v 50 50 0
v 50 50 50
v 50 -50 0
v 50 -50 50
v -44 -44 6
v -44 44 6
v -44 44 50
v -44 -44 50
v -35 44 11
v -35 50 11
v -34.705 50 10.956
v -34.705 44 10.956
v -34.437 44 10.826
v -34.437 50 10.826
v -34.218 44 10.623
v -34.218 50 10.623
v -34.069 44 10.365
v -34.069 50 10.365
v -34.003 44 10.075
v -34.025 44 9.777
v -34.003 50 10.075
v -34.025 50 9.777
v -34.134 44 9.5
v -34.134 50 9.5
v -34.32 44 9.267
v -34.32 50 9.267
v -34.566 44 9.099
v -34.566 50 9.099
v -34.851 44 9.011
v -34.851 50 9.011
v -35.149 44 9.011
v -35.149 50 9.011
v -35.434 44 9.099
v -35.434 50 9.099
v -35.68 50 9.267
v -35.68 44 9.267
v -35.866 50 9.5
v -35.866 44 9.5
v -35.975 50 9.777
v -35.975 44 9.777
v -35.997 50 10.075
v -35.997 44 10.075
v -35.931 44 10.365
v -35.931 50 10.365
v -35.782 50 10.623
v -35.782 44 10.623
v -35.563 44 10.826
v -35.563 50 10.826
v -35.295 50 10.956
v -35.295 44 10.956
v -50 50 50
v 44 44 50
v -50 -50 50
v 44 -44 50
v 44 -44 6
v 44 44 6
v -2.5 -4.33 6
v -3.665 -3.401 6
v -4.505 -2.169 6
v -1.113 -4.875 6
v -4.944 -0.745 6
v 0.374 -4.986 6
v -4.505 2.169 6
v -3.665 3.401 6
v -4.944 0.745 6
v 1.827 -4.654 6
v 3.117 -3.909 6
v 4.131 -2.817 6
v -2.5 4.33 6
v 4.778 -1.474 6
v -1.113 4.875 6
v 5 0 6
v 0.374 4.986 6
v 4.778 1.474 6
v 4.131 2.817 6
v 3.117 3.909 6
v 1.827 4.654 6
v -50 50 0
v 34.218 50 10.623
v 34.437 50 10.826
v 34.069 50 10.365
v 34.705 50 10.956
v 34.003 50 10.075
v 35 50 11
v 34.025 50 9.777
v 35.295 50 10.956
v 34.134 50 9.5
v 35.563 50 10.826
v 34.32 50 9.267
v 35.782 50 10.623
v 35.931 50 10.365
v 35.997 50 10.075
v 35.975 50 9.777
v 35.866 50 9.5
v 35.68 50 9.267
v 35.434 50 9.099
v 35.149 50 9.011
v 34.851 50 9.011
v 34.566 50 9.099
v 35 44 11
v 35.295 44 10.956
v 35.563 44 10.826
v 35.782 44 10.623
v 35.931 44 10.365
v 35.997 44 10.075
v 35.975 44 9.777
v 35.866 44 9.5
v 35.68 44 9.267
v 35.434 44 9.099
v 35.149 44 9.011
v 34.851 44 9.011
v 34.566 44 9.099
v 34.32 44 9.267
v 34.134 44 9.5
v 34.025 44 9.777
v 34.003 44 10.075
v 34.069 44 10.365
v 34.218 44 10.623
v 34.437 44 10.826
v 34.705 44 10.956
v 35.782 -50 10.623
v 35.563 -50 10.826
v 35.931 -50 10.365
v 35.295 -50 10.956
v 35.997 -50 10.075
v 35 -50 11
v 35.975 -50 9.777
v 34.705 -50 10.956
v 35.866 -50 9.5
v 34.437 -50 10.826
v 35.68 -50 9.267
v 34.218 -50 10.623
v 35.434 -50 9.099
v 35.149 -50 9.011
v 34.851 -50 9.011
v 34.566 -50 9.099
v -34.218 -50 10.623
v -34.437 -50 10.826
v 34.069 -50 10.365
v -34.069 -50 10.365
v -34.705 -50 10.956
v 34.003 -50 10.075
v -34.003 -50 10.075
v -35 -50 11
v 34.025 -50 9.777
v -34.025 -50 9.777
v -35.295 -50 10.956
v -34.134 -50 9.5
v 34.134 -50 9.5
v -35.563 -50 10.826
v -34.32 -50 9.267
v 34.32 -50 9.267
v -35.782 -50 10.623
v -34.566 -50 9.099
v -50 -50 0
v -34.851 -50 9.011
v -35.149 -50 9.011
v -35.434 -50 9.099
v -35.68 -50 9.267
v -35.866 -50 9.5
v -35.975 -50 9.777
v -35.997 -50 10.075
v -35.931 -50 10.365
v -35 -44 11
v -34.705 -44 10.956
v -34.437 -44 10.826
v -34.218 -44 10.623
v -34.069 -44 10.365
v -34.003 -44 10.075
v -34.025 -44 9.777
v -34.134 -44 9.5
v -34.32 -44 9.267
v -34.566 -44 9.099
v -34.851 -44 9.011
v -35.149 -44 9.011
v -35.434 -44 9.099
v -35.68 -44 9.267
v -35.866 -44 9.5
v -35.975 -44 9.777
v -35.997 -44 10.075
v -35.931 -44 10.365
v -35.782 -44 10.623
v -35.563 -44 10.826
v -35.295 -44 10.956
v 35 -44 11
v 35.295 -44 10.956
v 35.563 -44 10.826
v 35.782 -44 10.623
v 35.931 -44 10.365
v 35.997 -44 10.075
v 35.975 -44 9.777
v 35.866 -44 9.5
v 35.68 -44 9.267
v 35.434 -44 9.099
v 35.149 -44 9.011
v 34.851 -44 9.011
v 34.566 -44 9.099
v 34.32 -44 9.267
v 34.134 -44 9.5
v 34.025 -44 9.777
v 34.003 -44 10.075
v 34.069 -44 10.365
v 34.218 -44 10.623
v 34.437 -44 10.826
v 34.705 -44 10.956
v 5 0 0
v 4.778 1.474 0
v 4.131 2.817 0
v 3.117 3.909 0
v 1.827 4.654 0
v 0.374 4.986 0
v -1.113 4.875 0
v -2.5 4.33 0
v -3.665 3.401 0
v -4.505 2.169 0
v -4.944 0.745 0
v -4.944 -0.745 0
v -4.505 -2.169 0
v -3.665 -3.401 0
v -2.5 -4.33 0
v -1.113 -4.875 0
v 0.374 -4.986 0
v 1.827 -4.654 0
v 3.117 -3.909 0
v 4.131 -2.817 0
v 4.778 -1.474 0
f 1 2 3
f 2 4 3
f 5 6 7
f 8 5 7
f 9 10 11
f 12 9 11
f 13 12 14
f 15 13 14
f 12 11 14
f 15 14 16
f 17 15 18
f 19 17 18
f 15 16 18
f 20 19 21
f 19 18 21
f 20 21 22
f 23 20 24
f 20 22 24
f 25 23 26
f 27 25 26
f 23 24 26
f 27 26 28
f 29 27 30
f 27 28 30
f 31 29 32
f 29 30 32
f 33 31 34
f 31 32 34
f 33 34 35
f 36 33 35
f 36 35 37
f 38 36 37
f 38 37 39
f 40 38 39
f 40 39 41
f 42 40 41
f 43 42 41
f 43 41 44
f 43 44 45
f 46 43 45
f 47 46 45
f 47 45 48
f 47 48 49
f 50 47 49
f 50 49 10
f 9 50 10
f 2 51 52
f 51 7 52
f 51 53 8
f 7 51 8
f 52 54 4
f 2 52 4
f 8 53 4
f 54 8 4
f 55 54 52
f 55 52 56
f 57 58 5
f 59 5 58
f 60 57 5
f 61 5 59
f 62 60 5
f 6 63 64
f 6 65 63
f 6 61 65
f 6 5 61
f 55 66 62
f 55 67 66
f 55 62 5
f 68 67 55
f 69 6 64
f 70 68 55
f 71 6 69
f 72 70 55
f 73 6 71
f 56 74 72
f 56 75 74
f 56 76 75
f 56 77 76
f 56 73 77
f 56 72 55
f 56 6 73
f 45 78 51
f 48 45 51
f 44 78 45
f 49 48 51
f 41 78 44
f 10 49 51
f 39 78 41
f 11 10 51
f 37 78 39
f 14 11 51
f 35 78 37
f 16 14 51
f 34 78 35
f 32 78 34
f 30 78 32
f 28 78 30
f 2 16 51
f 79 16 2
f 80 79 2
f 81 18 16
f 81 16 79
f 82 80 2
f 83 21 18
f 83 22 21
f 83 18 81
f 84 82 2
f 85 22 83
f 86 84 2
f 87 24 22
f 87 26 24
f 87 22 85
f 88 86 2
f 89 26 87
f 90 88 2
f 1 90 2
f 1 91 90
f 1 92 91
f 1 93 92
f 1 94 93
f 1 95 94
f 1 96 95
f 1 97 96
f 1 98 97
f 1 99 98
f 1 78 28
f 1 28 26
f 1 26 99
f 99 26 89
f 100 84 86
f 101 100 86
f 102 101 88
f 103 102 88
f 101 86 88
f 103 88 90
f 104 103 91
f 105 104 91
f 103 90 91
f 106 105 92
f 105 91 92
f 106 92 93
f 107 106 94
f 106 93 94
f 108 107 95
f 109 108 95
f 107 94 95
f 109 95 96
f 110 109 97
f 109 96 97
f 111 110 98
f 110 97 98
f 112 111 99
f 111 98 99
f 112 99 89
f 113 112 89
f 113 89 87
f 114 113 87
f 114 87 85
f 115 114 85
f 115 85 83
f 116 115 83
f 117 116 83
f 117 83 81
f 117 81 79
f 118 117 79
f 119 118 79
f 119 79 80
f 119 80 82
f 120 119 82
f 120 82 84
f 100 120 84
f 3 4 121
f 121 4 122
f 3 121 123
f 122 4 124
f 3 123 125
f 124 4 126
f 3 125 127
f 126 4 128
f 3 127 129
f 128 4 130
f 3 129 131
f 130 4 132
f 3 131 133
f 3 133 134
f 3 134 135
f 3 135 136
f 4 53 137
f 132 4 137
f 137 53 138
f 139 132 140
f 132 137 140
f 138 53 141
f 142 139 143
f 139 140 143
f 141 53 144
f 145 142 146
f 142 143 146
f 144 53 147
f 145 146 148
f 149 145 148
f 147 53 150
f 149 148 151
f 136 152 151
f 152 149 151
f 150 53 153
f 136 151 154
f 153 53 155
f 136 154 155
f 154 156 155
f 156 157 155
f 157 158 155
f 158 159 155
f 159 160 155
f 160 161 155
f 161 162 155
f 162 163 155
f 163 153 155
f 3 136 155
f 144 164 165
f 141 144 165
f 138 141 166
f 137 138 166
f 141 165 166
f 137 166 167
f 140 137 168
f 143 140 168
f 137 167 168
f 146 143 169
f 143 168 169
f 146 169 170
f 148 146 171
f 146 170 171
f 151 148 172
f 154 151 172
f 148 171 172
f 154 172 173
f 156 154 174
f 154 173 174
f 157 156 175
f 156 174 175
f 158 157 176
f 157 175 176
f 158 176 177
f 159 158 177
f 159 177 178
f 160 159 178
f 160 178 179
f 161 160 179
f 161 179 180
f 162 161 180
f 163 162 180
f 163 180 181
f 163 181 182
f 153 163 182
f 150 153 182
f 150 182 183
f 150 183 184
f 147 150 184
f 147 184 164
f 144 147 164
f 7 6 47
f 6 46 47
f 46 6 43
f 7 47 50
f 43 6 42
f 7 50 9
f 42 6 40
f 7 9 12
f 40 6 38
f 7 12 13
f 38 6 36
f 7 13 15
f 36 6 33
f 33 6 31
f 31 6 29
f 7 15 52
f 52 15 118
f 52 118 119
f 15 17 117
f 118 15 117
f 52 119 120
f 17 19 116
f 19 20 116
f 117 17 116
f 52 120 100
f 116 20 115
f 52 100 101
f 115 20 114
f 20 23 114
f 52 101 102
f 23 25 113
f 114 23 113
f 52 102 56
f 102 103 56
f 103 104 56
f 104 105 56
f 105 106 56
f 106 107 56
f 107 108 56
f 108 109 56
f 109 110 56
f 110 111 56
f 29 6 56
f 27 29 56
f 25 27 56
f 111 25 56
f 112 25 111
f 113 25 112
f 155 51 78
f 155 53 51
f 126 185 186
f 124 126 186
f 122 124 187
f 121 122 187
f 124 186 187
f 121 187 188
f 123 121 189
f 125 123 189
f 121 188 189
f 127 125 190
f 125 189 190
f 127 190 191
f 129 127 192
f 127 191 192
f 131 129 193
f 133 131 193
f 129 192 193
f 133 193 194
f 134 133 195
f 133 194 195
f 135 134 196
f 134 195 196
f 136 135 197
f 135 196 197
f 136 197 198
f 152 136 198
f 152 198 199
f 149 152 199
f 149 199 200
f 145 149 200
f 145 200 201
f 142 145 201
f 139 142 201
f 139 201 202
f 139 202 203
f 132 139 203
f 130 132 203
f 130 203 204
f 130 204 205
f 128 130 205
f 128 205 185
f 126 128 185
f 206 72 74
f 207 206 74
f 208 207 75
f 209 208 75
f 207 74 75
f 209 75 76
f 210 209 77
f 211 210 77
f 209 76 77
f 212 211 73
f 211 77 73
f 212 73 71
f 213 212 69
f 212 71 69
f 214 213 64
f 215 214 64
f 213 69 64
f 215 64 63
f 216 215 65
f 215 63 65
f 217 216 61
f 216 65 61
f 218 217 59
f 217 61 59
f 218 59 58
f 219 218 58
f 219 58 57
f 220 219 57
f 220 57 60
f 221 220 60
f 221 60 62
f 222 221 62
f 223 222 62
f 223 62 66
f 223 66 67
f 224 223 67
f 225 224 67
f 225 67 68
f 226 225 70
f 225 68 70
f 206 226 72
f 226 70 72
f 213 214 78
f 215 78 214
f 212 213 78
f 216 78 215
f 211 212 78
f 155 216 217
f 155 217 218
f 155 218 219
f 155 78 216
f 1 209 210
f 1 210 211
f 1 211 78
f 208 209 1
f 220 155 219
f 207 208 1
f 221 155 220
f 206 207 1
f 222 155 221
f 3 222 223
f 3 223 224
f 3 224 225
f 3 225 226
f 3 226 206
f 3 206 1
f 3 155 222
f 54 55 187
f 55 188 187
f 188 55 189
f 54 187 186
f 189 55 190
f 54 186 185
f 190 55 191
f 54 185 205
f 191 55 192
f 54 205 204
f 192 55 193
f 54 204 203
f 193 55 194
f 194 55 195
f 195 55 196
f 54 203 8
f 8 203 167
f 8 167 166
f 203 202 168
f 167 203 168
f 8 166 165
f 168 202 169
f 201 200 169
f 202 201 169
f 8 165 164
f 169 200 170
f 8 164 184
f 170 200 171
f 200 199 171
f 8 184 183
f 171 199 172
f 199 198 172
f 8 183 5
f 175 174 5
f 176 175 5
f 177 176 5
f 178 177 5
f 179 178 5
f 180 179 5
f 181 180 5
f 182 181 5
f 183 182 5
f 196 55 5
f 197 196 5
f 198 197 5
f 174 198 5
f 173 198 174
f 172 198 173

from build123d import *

# Parameters (mm, degrees)
ESQUISSE1_W             = 88
ESQUISSE1_H             = 88
BOSS_EXTRU_1_DEPTH      = 6
ESQUISSE2_R             = 5
ENL_V_MAT_EXTRU_1_DEPTH = 6
ESQUISSE3_W             = 88
ESQUISSE3_H             = 50
BOSS_EXTRU_2_DEPTH      = 6
ESQUISSE4_W             = 50
ESQUISSE4_H             = 94
BOSS_EXTRU_3_DEPTH      = 6
ESQUISSE5_W             = 50
ESQUISSE5_H             = 94
BOSS_EXTRU_4_DEPTH      = 6
ESQUISSE6_W             = 100
ESQUISSE6_H             = 50
BOSS_EXTRU_5_DEPTH      = 6
ESQUISSE7_R             = 1
ENL_V_MAT_EXTRU_2_DEPTH = 100


with BuildPart() as part:
    # Esquisse1 → Boss.-Extru.1 (new body)
    with BuildSketch(Plane.XY):
        Rectangle(ESQUISSE1_W, ESQUISSE1_H)
    extrude(amount=BOSS_EXTRU_1_DEPTH)

    # Esquisse2 → Enlèv. mat.-Extru.1 (cut)
    with BuildSketch(Plane.XY.offset(6)):
        Circle(ESQUISSE2_R)
    extrude(amount=-ENL_V_MAT_EXTRU_1_DEPTH, mode=Mode.SUBTRACT)

    # Esquisse3 → Boss.-Extru.2 (add)
    with BuildSketch(Plane(origin=(0, -44, 0), x_dir=(-1, 0, 0), z_dir=(0, -1, 0))):
        with Locations((0, -25)):
            Rectangle(ESQUISSE3_W, ESQUISSE3_H)
    extrude(amount=BOSS_EXTRU_2_DEPTH)

    # Esquisse4 → Boss.-Extru.3 (add)
    with BuildSketch(Plane.ZY.offset(44)):
        with Locations((25, -3)):
            Rectangle(ESQUISSE4_W, ESQUISSE4_H)
    extrude(amount=BOSS_EXTRU_3_DEPTH)

    # Esquisse5 → Boss.-Extru.4 (add)
    with BuildSketch(Plane(origin=(44, 0, 0), x_dir=(0, 0, -1), z_dir=(1, 0, 0))):
        with Locations((-25, -3)):
            Rectangle(ESQUISSE5_W, ESQUISSE5_H)
    extrude(amount=BOSS_EXTRU_4_DEPTH)

    # Esquisse6 → Boss.-Extru.5 (add)
    with BuildSketch(Plane(origin=(0, 44, 0), x_dir=(1, 0, 0), z_dir=(0, 1, 0))):
        with Locations((0, -25)):
            Rectangle(ESQUISSE6_W, ESQUISSE6_H)
    extrude(amount=BOSS_EXTRU_5_DEPTH)

    # Esquisse7 → Enlèv. mat.-Extru.2 (cut)
    with BuildSketch(Plane(origin=(0, 50, 0), x_dir=(1, 0, 0), z_dir=(0, 1, 0))):
        with Locations(Location((35, -10, 0), (0, 0, 270))):
            Circle(ESQUISSE7_R)
        with Locations(Location((-35, -10, 0), (0, 0, 270))):
            Circle(ESQUISSE7_R)
    extrude(amount=-ENL_V_MAT_EXTRU_2_DEPTH, mode=Mode.SUBTRACT)


solid = part.part
